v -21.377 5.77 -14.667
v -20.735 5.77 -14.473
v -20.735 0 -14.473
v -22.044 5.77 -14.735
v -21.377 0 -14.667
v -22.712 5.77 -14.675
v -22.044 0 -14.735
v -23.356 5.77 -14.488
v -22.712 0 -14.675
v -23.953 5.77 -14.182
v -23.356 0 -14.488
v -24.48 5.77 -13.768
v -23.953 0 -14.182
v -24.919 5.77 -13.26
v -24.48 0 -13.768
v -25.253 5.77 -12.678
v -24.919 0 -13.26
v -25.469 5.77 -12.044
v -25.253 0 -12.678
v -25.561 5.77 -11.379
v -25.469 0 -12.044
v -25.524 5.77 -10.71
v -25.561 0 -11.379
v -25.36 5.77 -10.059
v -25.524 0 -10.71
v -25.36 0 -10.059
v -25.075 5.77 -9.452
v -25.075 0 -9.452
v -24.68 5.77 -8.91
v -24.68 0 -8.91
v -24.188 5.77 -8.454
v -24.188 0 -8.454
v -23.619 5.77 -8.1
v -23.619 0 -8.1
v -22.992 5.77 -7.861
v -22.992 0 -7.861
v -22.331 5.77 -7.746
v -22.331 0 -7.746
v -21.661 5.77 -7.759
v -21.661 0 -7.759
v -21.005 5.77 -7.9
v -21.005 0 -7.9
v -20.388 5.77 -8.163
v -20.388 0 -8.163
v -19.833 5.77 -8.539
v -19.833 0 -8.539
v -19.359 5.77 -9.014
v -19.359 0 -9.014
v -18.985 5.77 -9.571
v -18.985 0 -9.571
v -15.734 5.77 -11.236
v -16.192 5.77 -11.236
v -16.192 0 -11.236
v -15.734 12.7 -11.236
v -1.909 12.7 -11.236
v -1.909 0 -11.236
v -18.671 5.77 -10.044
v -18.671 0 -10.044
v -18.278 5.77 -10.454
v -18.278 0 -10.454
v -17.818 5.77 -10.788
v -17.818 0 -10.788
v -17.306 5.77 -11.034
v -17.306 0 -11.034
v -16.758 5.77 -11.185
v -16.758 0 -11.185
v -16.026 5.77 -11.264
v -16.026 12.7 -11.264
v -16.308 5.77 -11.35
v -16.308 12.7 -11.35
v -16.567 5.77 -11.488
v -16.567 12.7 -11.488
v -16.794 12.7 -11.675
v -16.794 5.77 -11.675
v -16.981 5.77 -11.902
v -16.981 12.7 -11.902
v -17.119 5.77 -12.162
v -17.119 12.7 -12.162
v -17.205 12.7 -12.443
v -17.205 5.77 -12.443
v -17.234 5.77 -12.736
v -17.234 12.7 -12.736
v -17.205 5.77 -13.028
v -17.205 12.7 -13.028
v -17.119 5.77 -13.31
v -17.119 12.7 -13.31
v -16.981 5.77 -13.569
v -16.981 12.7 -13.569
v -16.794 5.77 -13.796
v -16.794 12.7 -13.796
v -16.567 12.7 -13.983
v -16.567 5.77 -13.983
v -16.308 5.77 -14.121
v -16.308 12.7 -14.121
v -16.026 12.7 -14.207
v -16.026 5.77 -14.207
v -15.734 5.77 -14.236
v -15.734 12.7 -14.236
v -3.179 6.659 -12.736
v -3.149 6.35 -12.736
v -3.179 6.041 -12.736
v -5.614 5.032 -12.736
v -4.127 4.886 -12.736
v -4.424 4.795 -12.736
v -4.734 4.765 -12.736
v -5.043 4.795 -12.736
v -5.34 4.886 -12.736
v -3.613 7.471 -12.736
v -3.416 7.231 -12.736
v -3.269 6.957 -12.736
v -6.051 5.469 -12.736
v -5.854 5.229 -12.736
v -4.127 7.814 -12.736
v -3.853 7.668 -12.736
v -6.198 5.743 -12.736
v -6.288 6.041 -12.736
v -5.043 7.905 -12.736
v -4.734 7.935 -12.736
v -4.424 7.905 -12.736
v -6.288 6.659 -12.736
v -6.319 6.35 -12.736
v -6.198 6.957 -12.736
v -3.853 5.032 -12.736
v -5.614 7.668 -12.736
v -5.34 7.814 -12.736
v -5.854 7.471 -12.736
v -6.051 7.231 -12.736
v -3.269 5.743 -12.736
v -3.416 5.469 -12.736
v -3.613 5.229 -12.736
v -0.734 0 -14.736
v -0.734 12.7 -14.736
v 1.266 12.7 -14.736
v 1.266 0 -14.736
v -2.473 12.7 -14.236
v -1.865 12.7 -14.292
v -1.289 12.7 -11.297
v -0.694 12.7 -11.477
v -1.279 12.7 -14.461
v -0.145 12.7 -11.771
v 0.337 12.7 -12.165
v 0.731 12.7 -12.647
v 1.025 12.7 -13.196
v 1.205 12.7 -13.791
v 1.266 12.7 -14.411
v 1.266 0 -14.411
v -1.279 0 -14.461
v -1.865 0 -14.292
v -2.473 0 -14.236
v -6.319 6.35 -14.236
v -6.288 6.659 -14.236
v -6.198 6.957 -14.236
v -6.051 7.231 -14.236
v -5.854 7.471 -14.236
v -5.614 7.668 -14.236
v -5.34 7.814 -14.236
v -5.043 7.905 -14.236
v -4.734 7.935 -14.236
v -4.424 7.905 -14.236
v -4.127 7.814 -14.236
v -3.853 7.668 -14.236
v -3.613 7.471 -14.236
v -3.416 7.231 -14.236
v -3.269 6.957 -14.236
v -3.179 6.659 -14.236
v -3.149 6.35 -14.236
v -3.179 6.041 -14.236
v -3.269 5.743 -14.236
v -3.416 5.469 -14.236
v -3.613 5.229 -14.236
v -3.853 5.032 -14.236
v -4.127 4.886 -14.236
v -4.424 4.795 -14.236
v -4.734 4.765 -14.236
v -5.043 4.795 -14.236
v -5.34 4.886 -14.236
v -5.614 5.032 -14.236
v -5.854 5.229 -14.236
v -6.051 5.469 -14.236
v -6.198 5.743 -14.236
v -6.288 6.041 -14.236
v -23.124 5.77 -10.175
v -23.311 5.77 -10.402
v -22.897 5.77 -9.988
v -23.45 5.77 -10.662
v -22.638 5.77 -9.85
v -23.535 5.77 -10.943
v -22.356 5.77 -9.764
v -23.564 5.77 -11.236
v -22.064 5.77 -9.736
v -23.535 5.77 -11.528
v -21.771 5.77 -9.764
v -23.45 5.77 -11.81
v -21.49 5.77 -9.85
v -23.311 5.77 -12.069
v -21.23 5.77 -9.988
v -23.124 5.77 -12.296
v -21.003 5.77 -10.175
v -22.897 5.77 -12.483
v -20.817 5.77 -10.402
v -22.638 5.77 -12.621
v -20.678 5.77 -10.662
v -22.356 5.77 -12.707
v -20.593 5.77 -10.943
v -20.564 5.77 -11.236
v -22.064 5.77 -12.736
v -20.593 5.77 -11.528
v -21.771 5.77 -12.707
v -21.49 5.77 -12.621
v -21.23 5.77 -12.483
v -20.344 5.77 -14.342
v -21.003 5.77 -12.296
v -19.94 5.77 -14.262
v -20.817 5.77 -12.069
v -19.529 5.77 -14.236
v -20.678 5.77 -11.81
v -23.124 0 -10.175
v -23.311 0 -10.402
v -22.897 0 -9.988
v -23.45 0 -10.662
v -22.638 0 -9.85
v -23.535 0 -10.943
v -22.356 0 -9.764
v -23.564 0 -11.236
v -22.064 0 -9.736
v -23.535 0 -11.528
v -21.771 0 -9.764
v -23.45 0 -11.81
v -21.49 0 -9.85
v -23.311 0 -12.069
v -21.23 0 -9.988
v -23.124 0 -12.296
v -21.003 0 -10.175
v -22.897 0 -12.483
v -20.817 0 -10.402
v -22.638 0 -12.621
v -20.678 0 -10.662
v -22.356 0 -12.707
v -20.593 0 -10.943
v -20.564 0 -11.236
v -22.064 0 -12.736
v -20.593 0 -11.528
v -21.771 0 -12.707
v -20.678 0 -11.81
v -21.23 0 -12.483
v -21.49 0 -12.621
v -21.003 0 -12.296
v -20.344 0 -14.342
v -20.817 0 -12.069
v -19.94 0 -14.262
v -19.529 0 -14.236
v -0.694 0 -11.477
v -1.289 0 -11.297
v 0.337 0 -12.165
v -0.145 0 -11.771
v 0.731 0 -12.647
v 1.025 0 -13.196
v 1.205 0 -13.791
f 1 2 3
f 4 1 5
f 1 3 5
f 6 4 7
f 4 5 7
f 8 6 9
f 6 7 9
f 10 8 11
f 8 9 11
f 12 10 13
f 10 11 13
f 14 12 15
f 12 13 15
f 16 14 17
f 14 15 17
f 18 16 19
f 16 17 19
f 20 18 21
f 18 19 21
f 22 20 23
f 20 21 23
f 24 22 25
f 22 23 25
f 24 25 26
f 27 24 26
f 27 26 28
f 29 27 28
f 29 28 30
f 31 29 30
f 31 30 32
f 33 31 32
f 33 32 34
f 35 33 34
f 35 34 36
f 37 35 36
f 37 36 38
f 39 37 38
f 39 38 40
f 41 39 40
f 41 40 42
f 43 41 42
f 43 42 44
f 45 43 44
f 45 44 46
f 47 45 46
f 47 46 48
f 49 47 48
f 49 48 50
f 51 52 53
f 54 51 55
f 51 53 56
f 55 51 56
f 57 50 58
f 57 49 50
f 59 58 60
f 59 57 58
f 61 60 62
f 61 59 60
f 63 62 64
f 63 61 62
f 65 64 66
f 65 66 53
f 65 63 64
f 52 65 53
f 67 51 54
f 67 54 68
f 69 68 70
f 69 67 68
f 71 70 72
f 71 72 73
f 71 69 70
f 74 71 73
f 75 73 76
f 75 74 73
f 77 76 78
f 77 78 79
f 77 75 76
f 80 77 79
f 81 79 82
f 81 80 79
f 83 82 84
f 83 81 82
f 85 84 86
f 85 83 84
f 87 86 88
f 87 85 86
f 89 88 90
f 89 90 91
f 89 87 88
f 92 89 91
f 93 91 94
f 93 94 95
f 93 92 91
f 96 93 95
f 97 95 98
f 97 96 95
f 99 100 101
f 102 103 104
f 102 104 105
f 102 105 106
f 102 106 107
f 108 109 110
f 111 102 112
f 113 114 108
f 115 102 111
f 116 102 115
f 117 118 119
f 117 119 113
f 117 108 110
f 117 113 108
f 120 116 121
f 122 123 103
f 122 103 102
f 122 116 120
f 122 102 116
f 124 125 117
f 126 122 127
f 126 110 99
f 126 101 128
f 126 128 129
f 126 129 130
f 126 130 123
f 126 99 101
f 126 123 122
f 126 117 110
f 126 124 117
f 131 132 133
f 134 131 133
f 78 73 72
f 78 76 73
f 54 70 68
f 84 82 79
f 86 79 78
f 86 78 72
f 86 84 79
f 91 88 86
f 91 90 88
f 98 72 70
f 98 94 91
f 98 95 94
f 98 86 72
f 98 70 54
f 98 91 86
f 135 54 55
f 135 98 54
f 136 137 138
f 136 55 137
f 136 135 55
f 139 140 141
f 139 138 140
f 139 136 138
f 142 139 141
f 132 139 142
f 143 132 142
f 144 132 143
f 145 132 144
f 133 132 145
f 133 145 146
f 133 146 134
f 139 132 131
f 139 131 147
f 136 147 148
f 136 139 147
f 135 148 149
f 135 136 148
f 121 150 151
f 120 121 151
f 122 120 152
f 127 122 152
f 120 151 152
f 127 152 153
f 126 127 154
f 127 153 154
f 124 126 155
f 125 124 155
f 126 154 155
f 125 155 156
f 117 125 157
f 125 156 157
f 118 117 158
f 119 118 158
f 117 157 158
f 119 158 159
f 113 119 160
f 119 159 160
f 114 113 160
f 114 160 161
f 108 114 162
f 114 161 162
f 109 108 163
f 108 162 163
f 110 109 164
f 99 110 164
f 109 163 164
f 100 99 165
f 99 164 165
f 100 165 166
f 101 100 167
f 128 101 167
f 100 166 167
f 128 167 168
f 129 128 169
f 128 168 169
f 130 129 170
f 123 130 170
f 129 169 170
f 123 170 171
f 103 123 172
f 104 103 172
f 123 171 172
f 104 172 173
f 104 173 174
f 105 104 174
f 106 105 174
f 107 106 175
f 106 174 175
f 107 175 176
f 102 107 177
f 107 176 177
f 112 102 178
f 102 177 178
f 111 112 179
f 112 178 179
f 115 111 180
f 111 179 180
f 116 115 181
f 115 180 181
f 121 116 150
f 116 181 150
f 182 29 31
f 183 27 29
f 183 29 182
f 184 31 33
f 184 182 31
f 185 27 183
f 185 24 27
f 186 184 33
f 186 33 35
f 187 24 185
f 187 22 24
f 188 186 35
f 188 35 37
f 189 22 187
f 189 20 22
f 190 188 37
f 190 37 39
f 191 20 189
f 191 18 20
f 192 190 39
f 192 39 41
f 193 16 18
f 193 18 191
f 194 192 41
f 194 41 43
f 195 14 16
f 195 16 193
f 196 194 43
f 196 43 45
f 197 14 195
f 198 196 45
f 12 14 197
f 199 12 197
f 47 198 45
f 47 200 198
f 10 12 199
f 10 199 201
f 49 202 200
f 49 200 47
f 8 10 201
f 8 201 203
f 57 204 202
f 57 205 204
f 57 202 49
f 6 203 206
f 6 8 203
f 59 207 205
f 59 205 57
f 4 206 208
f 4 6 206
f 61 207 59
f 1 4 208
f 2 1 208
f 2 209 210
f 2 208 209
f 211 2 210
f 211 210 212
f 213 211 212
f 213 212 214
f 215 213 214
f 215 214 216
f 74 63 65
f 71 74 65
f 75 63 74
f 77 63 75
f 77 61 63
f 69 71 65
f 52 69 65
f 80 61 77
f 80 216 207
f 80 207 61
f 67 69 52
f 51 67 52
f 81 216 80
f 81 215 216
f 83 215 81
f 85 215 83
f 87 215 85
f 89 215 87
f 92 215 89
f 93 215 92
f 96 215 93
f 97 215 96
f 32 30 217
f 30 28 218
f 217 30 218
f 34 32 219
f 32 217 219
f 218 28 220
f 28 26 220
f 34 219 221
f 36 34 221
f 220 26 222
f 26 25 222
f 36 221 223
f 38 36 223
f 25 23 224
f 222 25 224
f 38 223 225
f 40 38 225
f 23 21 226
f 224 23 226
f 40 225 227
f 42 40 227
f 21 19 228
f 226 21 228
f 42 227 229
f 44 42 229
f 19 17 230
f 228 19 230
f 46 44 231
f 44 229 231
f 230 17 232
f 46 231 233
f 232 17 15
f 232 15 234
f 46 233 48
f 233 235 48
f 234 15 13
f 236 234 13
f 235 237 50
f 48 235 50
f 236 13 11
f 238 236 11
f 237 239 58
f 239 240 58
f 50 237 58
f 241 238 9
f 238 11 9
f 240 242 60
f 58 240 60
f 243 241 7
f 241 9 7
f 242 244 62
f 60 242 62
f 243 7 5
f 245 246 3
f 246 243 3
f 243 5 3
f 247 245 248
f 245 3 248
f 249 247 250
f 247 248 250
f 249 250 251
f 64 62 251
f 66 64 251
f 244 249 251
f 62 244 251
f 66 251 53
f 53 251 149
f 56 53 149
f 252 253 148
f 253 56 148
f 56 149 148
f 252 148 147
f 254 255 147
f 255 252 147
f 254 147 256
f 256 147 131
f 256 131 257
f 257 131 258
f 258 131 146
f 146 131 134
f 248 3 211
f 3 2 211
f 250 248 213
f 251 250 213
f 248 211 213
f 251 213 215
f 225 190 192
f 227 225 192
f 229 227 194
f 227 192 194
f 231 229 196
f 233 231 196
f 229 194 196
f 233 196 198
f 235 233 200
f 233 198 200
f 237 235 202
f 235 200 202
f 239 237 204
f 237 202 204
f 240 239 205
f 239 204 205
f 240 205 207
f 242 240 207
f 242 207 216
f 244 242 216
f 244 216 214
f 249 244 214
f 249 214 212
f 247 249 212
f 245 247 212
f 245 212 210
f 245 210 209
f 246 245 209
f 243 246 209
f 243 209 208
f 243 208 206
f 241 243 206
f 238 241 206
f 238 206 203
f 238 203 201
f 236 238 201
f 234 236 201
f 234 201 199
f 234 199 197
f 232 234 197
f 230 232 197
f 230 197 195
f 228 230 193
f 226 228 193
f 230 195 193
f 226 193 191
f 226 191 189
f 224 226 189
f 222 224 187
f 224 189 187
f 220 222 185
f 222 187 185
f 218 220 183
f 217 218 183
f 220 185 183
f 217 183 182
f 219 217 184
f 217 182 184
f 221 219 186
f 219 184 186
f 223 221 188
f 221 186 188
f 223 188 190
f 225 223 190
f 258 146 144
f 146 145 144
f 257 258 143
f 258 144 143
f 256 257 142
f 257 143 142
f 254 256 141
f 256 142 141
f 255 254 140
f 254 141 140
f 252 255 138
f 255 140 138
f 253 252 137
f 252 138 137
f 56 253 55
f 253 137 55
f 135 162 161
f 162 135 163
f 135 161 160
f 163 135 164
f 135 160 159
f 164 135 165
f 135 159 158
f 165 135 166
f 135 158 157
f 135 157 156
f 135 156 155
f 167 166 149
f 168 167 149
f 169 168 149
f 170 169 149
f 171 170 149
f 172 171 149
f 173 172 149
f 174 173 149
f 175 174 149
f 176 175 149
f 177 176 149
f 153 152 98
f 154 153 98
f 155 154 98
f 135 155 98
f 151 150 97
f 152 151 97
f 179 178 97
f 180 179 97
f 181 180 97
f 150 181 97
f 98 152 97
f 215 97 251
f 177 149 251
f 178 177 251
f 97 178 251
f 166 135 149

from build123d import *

# Parameters (mm, degrees)
SKETCH1_R           = 3.5
BOSS_EXTRUDE1_DEPTH = 12.7
CUT_EXTRUDE1_START  = -6.93
CUT_EXTRUDE1_DEPTH  = 6.93
SKETCH3_R           = 1.5
CUT_EXTRUDE2_DEPTH  = 6.77
SKETCH4_W           = 2
SKETCH4_H           = 0.5
BOSS_EXTRUDE2_DEPTH = 12.7
FILLET1_R           = 3.175
SKETCH5_R           = 2
CUT_EXTRUDE3_DEPTH  = 10
SKETCH6_R           = 1.585
CUT_EXTRUDE4_DEPTH  = 1.5


with BuildPart() as part:
    # Sketch1 → Boss-Extrude1 (new body)
    with BuildSketch(Plane(origin=(0, 0, 0), x_dir=(1, 0, 0), z_dir=(0, 1, 0))):
        with Locations((-22.063770306, 11.23554707)):
            Circle(SKETCH1_R)
        with BuildLine():
            ThreePointArc((-20.260994668, 14.23554707), (-19.017484475, 12.958957246), (-18.563770306, 11.23554707))
            Line((-18.563770306, 11.23554707), (1.266442488, 11.23554707))
            Line((1.266442488, 11.23554707), (1.266442488, 14.23554707))
            Line((1.266442488, 14.23554707), (-20.260994668, 14.23554707))
        make_face()
    extrude(amount=BOSS_EXTRUDE1_DEPTH)

    # Sketch2 → Cut-Extrude1 (cut)
    with BuildSketch(Plane(origin=(0, 12.7, 0), x_dir=(1, 0, 0), z_dir=(0, 1, 0)).offset(CUT_EXTRUDE1_START)):
        with BuildLine():
            Line((-18.563770306, 11.23554707), (-15.733557512, 11.23554707))
            ThreePointArc((-15.733557512, 11.23554707), (-17.233557512, 12.73554707), (-15.733557512, 14.23554707))
            Line((-15.733557512, 14.23554707), (-20.260994668, 14.23554707))
            ThreePointArc((-20.260994668, 14.23554707), (-25.110056137, 9.512136894), (-18.563770306, 11.23554707))
        make_face()
    extrude(amount=CUT_EXTRUDE1_DEPTH, mode=Mode.SUBTRACT)

    # Sketch3 → Cut-Extrude2 (cut, through all)
    with BuildSketch(Plane(origin=(0, 5.77, 0), x_dir=(1, 0, 0), z_dir=(0, 1, 0))):
        with Locations(Location((-22.063770306, 11.23554707, 0), (0, 0, 270))):  # turned: the seam where the file's is
            Circle(SKETCH3_R)
    extrude(amount=-CUT_EXTRUDE2_DEPTH, mode=Mode.SUBTRACT)

    # Sketch4 → Boss-Extrude2 (add)
    with BuildSketch(Plane(origin=(0, 12.7, 0), x_dir=(1, 0, 0), z_dir=(0, 1, 0))):
        with Locations((0.266442488, 14.48554707)):
            Rectangle(SKETCH4_W, SKETCH4_H)
        with BuildLine():
            Line((-2.472810226, 14.23554707), (-0.733557512, 14.23554707))
            Line((-0.733557512, 14.23554707), (-0.733557512, 14.73554707))
            ThreePointArc((-0.733557512, 14.73554707), (-1.567962172, 14.363028206), (-2.472810226, 14.23554707))
        make_face()
    extrude(amount=-BOSS_EXTRUDE2_DEPTH)

    # Fillet1
    fillet1_edges = [part.edges().sort_by_distance(p)[0] for p in [
        (-20.260994668, 2.885, -14.23554707),
        (-18.563770306, 2.885, -11.23554707),
        (1.266442488, 6.35, -11.23554707),
    ]]
    fillet(fillet1_edges, radius=FILLET1_R)

    # Sketch5 → Cut-Extrude3 (cut)
    with BuildSketch(Plane(origin=(0, 0, -14.23554707), x_dir=(-1, 0, 0), z_dir=(0, 0, -1))):
        with Locations((-37.221491695, -42.831378851)):
            Circle(SKETCH5_R)
        with Locations((-37.221491695, -47.531378851)):
            Circle(SKETCH5_R)
    extrude(amount=-CUT_EXTRUDE3_DEPTH, mode=Mode.SUBTRACT)

    # Sketch6 → Cut-Extrude4 (cut)
    with BuildSketch(Plane(origin=(0, 0, -14.23554707), x_dir=(-1, 0, 0), z_dir=(0, 0, -1))):
        with Locations((4.733557512, 6.35)):
            Circle(SKETCH6_R)
    extrude(amount=-CUT_EXTRUDE4_DEPTH, mode=Mode.SUBTRACT)


solid = part.part
